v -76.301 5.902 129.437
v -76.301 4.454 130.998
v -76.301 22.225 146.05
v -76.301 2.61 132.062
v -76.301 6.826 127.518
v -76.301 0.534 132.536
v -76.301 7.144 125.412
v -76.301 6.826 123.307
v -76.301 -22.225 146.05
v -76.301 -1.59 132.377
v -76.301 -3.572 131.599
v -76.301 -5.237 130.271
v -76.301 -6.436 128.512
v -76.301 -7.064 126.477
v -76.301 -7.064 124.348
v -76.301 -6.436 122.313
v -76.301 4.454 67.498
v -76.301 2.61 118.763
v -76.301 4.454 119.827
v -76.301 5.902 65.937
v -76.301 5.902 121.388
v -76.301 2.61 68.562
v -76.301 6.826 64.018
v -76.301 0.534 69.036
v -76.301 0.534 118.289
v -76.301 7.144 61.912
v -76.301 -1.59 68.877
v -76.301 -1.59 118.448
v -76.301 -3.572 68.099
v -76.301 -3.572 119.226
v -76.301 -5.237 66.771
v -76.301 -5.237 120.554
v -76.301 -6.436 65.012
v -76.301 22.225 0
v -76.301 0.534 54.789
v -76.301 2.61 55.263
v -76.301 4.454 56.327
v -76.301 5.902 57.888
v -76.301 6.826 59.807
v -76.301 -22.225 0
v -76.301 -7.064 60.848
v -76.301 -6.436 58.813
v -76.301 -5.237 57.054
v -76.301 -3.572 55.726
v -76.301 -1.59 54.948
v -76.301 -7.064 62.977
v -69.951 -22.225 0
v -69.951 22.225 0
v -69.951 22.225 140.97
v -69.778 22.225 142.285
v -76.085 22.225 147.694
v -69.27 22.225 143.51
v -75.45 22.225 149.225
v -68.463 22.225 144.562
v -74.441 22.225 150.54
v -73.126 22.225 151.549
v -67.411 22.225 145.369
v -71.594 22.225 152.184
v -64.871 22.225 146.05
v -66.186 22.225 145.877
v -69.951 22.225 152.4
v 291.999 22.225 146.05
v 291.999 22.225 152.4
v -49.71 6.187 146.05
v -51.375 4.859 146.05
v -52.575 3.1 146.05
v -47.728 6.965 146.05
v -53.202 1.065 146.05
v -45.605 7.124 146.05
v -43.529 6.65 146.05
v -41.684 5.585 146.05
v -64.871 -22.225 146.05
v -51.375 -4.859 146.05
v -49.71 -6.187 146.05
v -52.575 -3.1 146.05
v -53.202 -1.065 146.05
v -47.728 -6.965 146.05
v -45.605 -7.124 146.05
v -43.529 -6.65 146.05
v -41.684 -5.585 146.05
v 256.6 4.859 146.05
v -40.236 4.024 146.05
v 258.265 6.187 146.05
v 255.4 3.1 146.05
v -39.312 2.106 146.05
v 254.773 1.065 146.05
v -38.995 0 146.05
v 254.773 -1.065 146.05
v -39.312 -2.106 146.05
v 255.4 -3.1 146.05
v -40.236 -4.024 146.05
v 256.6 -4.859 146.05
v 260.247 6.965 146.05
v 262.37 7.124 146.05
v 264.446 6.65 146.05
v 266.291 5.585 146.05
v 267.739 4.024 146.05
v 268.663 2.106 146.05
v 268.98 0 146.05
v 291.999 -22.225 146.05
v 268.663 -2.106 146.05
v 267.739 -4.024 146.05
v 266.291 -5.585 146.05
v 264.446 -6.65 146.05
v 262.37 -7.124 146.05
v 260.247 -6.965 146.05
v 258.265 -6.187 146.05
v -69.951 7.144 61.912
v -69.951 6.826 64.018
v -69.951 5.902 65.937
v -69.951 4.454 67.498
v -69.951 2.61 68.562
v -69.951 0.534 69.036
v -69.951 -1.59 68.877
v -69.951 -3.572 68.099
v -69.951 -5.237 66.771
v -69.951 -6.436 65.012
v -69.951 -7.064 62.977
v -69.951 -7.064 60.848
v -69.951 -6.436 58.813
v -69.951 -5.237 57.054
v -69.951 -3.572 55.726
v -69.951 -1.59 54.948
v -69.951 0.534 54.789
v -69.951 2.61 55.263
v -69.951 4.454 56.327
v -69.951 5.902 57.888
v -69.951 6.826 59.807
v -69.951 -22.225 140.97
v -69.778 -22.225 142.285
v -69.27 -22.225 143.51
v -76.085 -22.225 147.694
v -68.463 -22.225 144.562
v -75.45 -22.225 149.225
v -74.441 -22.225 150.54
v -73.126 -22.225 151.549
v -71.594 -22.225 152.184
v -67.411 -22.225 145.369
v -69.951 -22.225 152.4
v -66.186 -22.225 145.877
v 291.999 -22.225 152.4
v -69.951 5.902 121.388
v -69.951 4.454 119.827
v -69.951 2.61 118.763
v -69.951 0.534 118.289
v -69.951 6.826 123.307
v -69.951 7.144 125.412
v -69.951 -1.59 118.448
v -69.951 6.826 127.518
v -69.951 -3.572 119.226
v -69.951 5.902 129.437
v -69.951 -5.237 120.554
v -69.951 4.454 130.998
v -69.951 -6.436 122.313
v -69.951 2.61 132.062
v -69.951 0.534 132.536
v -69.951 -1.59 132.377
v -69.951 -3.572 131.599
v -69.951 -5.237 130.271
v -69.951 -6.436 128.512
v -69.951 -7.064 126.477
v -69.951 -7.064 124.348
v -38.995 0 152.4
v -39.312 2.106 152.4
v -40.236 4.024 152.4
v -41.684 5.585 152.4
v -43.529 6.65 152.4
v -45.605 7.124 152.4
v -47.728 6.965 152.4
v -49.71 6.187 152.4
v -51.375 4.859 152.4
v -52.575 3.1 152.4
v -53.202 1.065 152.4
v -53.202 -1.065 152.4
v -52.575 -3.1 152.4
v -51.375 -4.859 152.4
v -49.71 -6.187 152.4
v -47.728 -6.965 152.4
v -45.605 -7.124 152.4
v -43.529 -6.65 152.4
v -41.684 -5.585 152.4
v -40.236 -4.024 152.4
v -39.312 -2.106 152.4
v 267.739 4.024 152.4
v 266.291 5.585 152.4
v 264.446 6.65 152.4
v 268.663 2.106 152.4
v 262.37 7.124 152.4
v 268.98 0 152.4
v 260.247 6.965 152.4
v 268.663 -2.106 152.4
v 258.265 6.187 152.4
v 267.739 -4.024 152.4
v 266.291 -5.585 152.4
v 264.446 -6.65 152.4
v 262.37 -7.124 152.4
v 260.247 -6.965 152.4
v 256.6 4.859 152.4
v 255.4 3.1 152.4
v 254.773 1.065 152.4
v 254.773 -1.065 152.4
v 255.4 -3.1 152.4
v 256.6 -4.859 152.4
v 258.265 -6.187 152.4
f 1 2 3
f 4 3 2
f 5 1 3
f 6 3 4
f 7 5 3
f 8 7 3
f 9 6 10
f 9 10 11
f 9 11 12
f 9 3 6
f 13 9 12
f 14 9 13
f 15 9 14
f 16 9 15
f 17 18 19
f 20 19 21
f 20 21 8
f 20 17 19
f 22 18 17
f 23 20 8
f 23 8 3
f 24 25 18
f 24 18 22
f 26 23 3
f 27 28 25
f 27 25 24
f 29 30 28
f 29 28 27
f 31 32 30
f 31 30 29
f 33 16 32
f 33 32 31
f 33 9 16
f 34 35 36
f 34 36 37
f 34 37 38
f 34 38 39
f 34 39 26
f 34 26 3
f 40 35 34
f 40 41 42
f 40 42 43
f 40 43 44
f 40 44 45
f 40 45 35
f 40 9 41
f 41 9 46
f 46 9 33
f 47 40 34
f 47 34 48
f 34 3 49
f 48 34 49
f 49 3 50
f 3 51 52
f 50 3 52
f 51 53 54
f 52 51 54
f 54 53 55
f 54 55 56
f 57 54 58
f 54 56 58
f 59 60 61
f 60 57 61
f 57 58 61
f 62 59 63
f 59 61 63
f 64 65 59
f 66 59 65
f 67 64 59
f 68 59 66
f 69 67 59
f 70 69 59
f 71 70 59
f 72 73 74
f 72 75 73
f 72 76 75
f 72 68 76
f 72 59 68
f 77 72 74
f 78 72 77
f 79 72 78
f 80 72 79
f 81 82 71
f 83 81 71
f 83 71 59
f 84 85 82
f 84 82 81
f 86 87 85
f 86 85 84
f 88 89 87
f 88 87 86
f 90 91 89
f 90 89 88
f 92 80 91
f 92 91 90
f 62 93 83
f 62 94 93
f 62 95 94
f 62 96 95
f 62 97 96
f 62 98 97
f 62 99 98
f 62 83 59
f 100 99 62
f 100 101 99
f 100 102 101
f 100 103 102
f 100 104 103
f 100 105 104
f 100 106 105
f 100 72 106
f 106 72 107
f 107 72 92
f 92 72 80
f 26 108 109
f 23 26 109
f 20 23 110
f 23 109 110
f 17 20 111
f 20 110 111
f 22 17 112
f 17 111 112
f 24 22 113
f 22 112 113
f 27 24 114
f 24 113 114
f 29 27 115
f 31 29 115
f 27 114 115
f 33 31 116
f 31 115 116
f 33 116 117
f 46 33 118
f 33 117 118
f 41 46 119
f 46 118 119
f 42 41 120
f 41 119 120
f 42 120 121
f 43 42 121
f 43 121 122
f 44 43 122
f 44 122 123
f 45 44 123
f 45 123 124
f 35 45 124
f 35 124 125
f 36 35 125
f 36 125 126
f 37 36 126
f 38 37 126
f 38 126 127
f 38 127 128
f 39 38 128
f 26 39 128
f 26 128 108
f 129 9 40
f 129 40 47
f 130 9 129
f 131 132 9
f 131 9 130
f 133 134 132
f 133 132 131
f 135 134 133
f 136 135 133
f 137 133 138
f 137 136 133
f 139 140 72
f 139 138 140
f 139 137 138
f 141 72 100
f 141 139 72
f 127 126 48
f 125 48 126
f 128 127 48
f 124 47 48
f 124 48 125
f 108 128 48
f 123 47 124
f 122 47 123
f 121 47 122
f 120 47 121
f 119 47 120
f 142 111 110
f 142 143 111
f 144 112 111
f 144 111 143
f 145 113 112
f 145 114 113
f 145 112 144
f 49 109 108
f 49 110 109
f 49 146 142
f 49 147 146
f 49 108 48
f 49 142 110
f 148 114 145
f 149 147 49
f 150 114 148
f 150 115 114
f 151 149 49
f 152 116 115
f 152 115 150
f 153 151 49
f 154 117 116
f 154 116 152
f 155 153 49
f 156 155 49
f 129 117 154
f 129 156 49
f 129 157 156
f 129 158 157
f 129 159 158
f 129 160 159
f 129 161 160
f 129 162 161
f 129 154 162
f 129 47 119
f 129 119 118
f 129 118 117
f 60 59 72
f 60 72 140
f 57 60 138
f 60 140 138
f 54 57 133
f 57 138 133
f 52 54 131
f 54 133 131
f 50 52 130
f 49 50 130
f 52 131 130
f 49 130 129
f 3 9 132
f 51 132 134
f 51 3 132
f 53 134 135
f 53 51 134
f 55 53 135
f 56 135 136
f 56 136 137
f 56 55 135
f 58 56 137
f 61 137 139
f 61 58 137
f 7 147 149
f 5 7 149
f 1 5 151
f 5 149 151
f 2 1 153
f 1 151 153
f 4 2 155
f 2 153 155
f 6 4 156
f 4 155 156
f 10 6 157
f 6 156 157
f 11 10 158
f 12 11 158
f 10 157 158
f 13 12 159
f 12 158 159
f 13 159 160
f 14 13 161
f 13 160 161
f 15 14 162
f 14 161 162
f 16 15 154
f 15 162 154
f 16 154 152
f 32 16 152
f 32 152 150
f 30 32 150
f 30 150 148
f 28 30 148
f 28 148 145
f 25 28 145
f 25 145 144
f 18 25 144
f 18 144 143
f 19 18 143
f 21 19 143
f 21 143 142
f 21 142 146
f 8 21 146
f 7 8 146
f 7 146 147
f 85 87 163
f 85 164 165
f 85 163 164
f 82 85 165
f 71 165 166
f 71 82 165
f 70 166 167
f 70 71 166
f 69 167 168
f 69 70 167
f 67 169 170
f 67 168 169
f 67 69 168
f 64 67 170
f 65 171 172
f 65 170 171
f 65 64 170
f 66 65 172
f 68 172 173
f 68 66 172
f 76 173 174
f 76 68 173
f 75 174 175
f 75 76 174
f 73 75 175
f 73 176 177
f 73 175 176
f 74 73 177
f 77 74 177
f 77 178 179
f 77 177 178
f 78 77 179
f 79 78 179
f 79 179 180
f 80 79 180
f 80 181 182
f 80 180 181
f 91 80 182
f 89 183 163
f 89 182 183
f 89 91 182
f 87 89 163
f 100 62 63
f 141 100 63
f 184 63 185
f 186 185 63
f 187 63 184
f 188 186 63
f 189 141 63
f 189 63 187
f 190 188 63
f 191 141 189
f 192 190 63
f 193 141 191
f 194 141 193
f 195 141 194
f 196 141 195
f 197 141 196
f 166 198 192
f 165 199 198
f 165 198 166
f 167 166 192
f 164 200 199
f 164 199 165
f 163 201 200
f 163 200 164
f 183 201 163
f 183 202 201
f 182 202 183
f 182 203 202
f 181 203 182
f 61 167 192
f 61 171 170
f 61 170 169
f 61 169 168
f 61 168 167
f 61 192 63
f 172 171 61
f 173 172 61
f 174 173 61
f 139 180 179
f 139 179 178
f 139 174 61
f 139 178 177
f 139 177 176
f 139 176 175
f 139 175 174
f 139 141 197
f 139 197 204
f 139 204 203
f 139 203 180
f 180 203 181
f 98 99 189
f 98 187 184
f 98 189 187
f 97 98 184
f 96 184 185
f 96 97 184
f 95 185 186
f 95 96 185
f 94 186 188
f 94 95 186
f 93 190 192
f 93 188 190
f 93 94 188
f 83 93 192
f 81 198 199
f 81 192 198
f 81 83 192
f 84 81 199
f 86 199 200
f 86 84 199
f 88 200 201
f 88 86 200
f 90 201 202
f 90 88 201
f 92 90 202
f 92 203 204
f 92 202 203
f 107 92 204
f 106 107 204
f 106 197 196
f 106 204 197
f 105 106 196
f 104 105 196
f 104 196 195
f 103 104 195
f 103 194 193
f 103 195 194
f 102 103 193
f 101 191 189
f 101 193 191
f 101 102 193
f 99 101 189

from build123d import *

# Parameters (mm, degrees)
F1_DEPTH = 22.225
F2_R     = 5.08
F3_R     = 6.35
F4_R     = 7.14375
F5_DEPTH = 152.401
F6_R     = 7.14375
F7_DEPTH = 76.301927


with BuildPart() as f1:
    # F0 (on Front) → F1 (new body, symmetric)
    with BuildSketch(Plane.XZ):
        Polygon((-76.300927, 152.4), (-76.300927, 0), (-69.950927, 0), (-69.950927, 146.05), (291.999073, 146.05), (291.999073, 152.4), align=None)
    extrude(amount=F1_DEPTH, both=True)

    # F2
    f2_edges = [f1.edges().sort_by_distance(p)[0] for p in [
        (-69.950927, 0, 146.05),
    ]]
    fillet(f2_edges, radius=F2_R)

    # F3
    f3_edges = [f1.edges().sort_by_distance(p)[0] for p in [
        (-76.300927, 0, 152.4),
    ]]
    fillet(f3_edges, radius=F3_R)

    # F4 (on Top) → F5 (cut, through all)
    with BuildSketch(Plane.XY):
        with Locations((261.836573, 0)):
            Circle(F4_R)
        with Locations((-46.138427, 0)):
            Circle(F4_R)
    extrude(amount=F5_DEPTH, mode=Mode.SUBTRACT)

    # F6 (on Right) → F7 (cut, through all)
    with BuildSketch(Plane.YZ):
        with Locations((0, 125.4125)):
            Circle(F6_R)
        with Locations((0, 61.9125)):
            Circle(F6_R)
    extrude(amount=-F7_DEPTH, mode=Mode.SUBTRACT)


solid = f1.part
